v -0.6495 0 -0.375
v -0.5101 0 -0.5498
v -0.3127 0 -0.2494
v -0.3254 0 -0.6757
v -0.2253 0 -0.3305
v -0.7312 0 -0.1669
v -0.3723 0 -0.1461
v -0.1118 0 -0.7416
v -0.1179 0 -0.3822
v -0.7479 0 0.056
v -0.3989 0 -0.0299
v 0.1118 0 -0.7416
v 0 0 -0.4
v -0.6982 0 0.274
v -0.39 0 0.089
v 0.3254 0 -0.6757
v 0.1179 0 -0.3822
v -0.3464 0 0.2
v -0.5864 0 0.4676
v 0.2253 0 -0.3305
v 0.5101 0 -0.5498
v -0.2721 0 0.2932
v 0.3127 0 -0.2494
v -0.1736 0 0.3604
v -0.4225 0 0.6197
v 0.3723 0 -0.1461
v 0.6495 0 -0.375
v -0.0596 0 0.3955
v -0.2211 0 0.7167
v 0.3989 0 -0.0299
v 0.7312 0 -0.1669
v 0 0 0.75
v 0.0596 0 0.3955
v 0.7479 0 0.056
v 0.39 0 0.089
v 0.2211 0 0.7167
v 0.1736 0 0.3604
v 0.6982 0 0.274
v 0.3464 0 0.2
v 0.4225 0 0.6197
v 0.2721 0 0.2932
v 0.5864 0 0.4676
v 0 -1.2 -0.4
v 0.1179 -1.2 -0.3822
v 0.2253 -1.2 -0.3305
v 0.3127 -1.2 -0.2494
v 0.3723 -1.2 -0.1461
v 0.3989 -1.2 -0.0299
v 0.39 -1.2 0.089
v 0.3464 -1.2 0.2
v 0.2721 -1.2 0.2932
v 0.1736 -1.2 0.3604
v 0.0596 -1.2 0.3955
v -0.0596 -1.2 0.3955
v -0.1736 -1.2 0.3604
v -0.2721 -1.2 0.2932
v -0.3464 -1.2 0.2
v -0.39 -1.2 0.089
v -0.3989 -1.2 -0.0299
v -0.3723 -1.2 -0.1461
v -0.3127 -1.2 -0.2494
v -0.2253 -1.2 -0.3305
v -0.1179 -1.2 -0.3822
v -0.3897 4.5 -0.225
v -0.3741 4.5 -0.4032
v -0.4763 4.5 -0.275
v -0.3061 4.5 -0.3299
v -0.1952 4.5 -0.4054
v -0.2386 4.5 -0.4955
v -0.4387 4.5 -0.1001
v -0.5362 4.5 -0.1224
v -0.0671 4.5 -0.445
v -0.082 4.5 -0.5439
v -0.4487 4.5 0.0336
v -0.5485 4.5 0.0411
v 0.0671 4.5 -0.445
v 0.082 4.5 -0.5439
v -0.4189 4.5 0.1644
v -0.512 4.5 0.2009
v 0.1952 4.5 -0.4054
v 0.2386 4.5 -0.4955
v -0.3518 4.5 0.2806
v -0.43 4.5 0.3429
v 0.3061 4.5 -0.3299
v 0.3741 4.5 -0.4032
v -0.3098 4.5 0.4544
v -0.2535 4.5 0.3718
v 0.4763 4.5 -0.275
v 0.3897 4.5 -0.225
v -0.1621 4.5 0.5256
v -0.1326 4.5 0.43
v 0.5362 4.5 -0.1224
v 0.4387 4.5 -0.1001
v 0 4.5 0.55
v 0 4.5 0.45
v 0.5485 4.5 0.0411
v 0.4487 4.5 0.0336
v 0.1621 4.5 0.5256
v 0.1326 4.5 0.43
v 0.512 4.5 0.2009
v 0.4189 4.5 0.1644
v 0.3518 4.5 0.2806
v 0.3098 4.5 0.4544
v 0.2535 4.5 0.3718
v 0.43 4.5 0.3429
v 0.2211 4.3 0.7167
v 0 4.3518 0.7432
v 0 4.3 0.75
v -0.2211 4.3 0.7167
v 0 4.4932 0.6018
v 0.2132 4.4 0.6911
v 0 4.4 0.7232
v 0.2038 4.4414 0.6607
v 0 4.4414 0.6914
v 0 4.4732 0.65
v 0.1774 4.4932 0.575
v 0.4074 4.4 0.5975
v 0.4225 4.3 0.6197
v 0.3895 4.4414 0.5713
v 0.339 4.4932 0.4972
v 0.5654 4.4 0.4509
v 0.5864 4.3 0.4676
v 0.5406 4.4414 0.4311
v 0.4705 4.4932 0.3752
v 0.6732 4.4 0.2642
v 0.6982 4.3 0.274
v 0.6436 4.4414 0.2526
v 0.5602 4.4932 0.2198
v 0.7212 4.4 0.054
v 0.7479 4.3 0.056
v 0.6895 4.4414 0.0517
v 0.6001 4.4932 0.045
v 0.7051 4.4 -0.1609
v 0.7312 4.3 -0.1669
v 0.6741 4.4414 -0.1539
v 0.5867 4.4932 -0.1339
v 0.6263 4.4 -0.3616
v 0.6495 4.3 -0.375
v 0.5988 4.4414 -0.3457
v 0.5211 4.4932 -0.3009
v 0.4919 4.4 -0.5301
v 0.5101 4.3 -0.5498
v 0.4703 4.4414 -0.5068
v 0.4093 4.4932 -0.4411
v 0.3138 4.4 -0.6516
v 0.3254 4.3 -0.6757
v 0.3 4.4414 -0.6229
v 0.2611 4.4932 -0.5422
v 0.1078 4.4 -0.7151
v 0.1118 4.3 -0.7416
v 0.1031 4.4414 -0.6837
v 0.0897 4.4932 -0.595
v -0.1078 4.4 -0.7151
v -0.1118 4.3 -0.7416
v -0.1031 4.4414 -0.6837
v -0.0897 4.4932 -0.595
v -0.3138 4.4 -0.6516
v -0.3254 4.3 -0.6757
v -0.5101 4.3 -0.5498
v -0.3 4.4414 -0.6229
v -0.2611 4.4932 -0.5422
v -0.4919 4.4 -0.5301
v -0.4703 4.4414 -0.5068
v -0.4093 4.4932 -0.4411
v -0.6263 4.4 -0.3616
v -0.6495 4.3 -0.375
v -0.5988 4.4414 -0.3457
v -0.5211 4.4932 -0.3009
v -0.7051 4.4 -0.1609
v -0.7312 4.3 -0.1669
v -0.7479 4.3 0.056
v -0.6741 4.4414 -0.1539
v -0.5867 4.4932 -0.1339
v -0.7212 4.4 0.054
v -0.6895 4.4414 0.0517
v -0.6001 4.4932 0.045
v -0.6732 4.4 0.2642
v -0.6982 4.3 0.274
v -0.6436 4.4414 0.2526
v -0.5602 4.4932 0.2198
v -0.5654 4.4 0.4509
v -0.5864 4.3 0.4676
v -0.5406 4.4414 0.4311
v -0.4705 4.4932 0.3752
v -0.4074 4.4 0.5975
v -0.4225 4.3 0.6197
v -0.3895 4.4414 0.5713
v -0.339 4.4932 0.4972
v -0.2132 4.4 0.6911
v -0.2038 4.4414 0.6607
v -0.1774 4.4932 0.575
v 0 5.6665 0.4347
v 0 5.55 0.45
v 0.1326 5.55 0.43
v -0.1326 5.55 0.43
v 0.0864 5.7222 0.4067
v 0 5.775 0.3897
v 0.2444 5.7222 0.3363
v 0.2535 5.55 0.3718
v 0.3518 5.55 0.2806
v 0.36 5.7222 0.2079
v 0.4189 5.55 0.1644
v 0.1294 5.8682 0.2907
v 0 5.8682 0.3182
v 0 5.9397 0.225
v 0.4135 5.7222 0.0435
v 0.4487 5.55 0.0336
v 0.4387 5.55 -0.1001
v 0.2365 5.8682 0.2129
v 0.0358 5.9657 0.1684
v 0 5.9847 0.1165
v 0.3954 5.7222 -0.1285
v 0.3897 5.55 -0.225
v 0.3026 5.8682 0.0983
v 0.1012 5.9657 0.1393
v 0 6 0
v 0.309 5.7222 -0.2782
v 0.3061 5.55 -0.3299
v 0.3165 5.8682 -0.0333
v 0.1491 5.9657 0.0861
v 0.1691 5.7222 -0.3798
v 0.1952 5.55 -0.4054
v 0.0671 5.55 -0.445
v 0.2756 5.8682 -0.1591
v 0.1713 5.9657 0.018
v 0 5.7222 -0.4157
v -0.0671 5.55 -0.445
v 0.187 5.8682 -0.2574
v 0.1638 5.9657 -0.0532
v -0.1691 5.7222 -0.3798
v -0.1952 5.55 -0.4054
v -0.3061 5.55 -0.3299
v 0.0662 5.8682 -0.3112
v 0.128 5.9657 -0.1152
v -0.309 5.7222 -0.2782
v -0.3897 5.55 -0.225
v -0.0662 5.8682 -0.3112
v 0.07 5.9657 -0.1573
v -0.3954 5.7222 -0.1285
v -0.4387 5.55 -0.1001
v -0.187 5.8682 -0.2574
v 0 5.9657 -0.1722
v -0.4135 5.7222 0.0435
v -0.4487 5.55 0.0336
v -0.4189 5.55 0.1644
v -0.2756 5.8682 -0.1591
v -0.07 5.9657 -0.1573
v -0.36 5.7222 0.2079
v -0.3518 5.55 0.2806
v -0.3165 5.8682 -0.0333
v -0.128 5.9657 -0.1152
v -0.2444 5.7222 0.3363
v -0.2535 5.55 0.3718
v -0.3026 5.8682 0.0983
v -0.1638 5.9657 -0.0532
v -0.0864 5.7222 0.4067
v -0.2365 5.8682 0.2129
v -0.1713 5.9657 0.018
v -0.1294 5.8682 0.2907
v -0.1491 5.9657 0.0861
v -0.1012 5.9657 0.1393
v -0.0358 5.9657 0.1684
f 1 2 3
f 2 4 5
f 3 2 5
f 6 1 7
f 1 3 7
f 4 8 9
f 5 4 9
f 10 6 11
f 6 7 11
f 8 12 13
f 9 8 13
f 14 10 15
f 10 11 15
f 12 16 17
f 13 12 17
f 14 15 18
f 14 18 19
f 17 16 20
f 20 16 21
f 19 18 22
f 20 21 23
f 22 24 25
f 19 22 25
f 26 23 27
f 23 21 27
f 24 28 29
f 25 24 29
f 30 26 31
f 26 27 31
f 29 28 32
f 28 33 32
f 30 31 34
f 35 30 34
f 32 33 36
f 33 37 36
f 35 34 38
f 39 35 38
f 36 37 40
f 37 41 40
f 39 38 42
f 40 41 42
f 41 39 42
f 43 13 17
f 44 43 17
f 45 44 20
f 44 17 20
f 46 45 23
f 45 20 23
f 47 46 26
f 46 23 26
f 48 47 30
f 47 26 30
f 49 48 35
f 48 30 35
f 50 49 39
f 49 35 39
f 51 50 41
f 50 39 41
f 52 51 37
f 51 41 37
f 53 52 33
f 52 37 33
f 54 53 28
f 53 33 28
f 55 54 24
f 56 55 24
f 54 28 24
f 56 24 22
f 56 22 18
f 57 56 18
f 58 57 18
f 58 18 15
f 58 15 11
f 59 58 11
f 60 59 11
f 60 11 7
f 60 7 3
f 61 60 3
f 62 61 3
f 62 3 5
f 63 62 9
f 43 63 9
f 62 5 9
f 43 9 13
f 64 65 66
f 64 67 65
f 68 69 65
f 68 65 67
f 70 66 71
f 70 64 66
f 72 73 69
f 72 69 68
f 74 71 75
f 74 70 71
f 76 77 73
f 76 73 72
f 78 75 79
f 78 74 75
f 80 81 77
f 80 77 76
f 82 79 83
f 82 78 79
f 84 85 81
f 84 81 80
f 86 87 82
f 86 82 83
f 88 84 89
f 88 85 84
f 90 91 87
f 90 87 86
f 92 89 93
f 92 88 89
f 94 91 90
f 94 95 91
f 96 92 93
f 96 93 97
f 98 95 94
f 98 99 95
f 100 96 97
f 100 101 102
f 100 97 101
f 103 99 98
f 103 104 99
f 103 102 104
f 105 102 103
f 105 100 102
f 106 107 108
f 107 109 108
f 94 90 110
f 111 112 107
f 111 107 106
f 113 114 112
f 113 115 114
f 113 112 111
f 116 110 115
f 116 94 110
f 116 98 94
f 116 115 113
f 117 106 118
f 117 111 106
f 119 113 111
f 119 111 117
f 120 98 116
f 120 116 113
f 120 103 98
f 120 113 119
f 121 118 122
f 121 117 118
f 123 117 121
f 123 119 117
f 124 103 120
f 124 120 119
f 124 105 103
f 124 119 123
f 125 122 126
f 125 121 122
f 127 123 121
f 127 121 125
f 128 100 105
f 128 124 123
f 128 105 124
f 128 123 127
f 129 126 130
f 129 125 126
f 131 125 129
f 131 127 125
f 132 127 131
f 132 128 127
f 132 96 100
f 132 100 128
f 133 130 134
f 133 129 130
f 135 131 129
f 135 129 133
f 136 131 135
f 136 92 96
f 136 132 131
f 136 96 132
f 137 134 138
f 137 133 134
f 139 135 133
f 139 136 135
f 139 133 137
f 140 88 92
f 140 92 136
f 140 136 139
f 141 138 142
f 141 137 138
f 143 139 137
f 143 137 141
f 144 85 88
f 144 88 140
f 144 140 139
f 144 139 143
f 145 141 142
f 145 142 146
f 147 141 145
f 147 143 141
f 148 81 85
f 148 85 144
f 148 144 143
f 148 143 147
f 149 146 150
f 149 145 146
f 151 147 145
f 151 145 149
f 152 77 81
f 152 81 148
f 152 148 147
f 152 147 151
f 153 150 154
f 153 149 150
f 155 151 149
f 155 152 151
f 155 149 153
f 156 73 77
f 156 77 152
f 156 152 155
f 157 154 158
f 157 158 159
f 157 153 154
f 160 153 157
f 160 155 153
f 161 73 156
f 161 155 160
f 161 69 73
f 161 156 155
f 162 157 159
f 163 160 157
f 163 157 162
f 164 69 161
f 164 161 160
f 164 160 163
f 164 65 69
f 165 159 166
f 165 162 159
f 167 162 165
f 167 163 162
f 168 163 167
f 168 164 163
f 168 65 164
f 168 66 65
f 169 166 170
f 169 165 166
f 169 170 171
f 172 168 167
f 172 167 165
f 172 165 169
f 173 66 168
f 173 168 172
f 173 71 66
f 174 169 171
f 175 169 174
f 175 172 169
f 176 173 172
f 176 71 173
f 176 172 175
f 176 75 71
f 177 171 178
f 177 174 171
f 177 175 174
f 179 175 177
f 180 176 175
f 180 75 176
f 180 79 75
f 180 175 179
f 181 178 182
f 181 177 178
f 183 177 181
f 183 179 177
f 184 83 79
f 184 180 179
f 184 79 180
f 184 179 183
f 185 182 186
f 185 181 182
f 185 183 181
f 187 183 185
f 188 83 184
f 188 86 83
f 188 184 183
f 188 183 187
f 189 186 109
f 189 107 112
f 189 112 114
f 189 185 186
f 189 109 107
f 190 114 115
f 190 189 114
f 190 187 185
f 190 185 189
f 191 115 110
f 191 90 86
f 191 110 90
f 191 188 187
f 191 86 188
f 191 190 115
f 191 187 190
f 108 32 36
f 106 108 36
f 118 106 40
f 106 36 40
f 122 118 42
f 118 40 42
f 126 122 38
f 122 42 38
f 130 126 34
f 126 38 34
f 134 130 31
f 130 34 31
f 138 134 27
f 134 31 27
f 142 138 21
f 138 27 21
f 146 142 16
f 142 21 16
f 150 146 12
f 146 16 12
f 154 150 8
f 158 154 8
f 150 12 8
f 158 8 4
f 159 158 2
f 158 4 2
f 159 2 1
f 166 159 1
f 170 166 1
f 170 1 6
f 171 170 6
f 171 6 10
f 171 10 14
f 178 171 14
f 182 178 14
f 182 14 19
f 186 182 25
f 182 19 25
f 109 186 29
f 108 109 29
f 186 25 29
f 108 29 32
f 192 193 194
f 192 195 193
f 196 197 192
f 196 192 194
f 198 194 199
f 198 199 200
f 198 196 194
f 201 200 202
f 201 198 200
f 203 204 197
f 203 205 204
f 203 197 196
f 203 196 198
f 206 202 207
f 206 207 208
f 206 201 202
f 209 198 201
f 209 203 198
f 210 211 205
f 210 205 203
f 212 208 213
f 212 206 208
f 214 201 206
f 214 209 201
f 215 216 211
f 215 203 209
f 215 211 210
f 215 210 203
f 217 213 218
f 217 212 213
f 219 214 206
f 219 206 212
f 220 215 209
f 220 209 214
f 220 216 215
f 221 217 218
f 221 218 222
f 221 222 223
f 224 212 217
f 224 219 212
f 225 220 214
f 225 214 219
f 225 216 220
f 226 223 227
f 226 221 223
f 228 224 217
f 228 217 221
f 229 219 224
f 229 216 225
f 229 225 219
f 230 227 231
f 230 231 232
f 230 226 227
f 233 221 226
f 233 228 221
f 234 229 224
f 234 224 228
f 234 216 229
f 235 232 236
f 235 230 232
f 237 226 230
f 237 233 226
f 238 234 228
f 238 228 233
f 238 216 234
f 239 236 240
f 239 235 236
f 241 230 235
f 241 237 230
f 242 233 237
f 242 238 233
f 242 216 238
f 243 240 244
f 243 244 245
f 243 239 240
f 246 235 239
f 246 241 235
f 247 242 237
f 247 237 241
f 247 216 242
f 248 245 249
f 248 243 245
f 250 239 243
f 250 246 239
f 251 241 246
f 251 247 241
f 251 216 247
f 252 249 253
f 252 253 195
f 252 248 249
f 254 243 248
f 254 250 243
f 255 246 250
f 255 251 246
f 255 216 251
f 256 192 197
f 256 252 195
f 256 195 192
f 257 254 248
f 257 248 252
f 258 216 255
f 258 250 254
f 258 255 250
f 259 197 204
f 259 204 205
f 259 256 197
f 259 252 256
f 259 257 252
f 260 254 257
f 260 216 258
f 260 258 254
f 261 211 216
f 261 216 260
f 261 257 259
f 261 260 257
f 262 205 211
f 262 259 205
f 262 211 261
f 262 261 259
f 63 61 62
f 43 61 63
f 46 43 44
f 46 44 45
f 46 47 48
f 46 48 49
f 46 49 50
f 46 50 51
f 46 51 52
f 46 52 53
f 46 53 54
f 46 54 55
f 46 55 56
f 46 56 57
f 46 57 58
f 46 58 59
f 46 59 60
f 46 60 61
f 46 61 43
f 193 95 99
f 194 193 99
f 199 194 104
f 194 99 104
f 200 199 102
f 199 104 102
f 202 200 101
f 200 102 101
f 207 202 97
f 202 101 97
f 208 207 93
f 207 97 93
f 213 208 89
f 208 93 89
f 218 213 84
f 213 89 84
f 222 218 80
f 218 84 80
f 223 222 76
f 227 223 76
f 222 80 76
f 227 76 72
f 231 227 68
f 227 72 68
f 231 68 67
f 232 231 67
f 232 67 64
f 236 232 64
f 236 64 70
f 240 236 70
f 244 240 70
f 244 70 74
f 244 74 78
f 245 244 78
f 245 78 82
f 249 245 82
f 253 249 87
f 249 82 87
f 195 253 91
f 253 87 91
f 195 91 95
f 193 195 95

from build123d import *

# Parameters (mm, degrees)
SKETCH_1_R      = 0.75
EXTRUDE_1_DEPTH = 4.5
SKETCH_2_R      = 0.45
EXTRUDE_2_DEPTH = 1.5
SKETCH_3_R      = 0.4
EXTRUDE_3_DEPTH = 1.2
FILLET_1_R      = 0.2
FILLET_2_R      = 0.45


with BuildPart() as part:
    # 草图1 → 凸台-拉伸1 (new body)
    with BuildSketch(Plane(origin=(0, 0, 0), x_dir=(1, 0, 0), z_dir=(0, 1, 0))):
        with Locations(Location((0, 0, 0), (0, 0, 270))):
            Circle(SKETCH_1_R)
    extrude(amount=EXTRUDE_1_DEPTH)

    # 草图2 → 凸台-拉伸2 (add)
    with BuildSketch(Plane(origin=(0, 4.5, 0), x_dir=(1, 0, 0), z_dir=(0, 1, 0))):
        with Locations(Location((0, 0, 0), (0, 0, 270))):
            Circle(SKETCH_2_R)
    extrude(amount=EXTRUDE_2_DEPTH)

    # 草图3 → 凸台-拉伸3 (add)
    with BuildSketch(Plane.XZ):
        with Locations(Location((0, 0, 0), (0, 0, 270))):
            Circle(SKETCH_3_R)
    extrude(amount=EXTRUDE_3_DEPTH)

    # 圆角1
    fillet_1_edges = [part.edges().sort_by_distance(p)[0] for p in [
        (0, 4.5, -0.75),
    ]]
    fillet(fillet_1_edges, radius=FILLET_1_R)

    # 圆角2
    fillet_2_edges = [part.edges().sort_by_distance(p)[0] for p in [
        (0, 6, -0.45),
    ]]
    fillet(fillet_2_edges, radius=FILLET_2_R)


solid = part.part
